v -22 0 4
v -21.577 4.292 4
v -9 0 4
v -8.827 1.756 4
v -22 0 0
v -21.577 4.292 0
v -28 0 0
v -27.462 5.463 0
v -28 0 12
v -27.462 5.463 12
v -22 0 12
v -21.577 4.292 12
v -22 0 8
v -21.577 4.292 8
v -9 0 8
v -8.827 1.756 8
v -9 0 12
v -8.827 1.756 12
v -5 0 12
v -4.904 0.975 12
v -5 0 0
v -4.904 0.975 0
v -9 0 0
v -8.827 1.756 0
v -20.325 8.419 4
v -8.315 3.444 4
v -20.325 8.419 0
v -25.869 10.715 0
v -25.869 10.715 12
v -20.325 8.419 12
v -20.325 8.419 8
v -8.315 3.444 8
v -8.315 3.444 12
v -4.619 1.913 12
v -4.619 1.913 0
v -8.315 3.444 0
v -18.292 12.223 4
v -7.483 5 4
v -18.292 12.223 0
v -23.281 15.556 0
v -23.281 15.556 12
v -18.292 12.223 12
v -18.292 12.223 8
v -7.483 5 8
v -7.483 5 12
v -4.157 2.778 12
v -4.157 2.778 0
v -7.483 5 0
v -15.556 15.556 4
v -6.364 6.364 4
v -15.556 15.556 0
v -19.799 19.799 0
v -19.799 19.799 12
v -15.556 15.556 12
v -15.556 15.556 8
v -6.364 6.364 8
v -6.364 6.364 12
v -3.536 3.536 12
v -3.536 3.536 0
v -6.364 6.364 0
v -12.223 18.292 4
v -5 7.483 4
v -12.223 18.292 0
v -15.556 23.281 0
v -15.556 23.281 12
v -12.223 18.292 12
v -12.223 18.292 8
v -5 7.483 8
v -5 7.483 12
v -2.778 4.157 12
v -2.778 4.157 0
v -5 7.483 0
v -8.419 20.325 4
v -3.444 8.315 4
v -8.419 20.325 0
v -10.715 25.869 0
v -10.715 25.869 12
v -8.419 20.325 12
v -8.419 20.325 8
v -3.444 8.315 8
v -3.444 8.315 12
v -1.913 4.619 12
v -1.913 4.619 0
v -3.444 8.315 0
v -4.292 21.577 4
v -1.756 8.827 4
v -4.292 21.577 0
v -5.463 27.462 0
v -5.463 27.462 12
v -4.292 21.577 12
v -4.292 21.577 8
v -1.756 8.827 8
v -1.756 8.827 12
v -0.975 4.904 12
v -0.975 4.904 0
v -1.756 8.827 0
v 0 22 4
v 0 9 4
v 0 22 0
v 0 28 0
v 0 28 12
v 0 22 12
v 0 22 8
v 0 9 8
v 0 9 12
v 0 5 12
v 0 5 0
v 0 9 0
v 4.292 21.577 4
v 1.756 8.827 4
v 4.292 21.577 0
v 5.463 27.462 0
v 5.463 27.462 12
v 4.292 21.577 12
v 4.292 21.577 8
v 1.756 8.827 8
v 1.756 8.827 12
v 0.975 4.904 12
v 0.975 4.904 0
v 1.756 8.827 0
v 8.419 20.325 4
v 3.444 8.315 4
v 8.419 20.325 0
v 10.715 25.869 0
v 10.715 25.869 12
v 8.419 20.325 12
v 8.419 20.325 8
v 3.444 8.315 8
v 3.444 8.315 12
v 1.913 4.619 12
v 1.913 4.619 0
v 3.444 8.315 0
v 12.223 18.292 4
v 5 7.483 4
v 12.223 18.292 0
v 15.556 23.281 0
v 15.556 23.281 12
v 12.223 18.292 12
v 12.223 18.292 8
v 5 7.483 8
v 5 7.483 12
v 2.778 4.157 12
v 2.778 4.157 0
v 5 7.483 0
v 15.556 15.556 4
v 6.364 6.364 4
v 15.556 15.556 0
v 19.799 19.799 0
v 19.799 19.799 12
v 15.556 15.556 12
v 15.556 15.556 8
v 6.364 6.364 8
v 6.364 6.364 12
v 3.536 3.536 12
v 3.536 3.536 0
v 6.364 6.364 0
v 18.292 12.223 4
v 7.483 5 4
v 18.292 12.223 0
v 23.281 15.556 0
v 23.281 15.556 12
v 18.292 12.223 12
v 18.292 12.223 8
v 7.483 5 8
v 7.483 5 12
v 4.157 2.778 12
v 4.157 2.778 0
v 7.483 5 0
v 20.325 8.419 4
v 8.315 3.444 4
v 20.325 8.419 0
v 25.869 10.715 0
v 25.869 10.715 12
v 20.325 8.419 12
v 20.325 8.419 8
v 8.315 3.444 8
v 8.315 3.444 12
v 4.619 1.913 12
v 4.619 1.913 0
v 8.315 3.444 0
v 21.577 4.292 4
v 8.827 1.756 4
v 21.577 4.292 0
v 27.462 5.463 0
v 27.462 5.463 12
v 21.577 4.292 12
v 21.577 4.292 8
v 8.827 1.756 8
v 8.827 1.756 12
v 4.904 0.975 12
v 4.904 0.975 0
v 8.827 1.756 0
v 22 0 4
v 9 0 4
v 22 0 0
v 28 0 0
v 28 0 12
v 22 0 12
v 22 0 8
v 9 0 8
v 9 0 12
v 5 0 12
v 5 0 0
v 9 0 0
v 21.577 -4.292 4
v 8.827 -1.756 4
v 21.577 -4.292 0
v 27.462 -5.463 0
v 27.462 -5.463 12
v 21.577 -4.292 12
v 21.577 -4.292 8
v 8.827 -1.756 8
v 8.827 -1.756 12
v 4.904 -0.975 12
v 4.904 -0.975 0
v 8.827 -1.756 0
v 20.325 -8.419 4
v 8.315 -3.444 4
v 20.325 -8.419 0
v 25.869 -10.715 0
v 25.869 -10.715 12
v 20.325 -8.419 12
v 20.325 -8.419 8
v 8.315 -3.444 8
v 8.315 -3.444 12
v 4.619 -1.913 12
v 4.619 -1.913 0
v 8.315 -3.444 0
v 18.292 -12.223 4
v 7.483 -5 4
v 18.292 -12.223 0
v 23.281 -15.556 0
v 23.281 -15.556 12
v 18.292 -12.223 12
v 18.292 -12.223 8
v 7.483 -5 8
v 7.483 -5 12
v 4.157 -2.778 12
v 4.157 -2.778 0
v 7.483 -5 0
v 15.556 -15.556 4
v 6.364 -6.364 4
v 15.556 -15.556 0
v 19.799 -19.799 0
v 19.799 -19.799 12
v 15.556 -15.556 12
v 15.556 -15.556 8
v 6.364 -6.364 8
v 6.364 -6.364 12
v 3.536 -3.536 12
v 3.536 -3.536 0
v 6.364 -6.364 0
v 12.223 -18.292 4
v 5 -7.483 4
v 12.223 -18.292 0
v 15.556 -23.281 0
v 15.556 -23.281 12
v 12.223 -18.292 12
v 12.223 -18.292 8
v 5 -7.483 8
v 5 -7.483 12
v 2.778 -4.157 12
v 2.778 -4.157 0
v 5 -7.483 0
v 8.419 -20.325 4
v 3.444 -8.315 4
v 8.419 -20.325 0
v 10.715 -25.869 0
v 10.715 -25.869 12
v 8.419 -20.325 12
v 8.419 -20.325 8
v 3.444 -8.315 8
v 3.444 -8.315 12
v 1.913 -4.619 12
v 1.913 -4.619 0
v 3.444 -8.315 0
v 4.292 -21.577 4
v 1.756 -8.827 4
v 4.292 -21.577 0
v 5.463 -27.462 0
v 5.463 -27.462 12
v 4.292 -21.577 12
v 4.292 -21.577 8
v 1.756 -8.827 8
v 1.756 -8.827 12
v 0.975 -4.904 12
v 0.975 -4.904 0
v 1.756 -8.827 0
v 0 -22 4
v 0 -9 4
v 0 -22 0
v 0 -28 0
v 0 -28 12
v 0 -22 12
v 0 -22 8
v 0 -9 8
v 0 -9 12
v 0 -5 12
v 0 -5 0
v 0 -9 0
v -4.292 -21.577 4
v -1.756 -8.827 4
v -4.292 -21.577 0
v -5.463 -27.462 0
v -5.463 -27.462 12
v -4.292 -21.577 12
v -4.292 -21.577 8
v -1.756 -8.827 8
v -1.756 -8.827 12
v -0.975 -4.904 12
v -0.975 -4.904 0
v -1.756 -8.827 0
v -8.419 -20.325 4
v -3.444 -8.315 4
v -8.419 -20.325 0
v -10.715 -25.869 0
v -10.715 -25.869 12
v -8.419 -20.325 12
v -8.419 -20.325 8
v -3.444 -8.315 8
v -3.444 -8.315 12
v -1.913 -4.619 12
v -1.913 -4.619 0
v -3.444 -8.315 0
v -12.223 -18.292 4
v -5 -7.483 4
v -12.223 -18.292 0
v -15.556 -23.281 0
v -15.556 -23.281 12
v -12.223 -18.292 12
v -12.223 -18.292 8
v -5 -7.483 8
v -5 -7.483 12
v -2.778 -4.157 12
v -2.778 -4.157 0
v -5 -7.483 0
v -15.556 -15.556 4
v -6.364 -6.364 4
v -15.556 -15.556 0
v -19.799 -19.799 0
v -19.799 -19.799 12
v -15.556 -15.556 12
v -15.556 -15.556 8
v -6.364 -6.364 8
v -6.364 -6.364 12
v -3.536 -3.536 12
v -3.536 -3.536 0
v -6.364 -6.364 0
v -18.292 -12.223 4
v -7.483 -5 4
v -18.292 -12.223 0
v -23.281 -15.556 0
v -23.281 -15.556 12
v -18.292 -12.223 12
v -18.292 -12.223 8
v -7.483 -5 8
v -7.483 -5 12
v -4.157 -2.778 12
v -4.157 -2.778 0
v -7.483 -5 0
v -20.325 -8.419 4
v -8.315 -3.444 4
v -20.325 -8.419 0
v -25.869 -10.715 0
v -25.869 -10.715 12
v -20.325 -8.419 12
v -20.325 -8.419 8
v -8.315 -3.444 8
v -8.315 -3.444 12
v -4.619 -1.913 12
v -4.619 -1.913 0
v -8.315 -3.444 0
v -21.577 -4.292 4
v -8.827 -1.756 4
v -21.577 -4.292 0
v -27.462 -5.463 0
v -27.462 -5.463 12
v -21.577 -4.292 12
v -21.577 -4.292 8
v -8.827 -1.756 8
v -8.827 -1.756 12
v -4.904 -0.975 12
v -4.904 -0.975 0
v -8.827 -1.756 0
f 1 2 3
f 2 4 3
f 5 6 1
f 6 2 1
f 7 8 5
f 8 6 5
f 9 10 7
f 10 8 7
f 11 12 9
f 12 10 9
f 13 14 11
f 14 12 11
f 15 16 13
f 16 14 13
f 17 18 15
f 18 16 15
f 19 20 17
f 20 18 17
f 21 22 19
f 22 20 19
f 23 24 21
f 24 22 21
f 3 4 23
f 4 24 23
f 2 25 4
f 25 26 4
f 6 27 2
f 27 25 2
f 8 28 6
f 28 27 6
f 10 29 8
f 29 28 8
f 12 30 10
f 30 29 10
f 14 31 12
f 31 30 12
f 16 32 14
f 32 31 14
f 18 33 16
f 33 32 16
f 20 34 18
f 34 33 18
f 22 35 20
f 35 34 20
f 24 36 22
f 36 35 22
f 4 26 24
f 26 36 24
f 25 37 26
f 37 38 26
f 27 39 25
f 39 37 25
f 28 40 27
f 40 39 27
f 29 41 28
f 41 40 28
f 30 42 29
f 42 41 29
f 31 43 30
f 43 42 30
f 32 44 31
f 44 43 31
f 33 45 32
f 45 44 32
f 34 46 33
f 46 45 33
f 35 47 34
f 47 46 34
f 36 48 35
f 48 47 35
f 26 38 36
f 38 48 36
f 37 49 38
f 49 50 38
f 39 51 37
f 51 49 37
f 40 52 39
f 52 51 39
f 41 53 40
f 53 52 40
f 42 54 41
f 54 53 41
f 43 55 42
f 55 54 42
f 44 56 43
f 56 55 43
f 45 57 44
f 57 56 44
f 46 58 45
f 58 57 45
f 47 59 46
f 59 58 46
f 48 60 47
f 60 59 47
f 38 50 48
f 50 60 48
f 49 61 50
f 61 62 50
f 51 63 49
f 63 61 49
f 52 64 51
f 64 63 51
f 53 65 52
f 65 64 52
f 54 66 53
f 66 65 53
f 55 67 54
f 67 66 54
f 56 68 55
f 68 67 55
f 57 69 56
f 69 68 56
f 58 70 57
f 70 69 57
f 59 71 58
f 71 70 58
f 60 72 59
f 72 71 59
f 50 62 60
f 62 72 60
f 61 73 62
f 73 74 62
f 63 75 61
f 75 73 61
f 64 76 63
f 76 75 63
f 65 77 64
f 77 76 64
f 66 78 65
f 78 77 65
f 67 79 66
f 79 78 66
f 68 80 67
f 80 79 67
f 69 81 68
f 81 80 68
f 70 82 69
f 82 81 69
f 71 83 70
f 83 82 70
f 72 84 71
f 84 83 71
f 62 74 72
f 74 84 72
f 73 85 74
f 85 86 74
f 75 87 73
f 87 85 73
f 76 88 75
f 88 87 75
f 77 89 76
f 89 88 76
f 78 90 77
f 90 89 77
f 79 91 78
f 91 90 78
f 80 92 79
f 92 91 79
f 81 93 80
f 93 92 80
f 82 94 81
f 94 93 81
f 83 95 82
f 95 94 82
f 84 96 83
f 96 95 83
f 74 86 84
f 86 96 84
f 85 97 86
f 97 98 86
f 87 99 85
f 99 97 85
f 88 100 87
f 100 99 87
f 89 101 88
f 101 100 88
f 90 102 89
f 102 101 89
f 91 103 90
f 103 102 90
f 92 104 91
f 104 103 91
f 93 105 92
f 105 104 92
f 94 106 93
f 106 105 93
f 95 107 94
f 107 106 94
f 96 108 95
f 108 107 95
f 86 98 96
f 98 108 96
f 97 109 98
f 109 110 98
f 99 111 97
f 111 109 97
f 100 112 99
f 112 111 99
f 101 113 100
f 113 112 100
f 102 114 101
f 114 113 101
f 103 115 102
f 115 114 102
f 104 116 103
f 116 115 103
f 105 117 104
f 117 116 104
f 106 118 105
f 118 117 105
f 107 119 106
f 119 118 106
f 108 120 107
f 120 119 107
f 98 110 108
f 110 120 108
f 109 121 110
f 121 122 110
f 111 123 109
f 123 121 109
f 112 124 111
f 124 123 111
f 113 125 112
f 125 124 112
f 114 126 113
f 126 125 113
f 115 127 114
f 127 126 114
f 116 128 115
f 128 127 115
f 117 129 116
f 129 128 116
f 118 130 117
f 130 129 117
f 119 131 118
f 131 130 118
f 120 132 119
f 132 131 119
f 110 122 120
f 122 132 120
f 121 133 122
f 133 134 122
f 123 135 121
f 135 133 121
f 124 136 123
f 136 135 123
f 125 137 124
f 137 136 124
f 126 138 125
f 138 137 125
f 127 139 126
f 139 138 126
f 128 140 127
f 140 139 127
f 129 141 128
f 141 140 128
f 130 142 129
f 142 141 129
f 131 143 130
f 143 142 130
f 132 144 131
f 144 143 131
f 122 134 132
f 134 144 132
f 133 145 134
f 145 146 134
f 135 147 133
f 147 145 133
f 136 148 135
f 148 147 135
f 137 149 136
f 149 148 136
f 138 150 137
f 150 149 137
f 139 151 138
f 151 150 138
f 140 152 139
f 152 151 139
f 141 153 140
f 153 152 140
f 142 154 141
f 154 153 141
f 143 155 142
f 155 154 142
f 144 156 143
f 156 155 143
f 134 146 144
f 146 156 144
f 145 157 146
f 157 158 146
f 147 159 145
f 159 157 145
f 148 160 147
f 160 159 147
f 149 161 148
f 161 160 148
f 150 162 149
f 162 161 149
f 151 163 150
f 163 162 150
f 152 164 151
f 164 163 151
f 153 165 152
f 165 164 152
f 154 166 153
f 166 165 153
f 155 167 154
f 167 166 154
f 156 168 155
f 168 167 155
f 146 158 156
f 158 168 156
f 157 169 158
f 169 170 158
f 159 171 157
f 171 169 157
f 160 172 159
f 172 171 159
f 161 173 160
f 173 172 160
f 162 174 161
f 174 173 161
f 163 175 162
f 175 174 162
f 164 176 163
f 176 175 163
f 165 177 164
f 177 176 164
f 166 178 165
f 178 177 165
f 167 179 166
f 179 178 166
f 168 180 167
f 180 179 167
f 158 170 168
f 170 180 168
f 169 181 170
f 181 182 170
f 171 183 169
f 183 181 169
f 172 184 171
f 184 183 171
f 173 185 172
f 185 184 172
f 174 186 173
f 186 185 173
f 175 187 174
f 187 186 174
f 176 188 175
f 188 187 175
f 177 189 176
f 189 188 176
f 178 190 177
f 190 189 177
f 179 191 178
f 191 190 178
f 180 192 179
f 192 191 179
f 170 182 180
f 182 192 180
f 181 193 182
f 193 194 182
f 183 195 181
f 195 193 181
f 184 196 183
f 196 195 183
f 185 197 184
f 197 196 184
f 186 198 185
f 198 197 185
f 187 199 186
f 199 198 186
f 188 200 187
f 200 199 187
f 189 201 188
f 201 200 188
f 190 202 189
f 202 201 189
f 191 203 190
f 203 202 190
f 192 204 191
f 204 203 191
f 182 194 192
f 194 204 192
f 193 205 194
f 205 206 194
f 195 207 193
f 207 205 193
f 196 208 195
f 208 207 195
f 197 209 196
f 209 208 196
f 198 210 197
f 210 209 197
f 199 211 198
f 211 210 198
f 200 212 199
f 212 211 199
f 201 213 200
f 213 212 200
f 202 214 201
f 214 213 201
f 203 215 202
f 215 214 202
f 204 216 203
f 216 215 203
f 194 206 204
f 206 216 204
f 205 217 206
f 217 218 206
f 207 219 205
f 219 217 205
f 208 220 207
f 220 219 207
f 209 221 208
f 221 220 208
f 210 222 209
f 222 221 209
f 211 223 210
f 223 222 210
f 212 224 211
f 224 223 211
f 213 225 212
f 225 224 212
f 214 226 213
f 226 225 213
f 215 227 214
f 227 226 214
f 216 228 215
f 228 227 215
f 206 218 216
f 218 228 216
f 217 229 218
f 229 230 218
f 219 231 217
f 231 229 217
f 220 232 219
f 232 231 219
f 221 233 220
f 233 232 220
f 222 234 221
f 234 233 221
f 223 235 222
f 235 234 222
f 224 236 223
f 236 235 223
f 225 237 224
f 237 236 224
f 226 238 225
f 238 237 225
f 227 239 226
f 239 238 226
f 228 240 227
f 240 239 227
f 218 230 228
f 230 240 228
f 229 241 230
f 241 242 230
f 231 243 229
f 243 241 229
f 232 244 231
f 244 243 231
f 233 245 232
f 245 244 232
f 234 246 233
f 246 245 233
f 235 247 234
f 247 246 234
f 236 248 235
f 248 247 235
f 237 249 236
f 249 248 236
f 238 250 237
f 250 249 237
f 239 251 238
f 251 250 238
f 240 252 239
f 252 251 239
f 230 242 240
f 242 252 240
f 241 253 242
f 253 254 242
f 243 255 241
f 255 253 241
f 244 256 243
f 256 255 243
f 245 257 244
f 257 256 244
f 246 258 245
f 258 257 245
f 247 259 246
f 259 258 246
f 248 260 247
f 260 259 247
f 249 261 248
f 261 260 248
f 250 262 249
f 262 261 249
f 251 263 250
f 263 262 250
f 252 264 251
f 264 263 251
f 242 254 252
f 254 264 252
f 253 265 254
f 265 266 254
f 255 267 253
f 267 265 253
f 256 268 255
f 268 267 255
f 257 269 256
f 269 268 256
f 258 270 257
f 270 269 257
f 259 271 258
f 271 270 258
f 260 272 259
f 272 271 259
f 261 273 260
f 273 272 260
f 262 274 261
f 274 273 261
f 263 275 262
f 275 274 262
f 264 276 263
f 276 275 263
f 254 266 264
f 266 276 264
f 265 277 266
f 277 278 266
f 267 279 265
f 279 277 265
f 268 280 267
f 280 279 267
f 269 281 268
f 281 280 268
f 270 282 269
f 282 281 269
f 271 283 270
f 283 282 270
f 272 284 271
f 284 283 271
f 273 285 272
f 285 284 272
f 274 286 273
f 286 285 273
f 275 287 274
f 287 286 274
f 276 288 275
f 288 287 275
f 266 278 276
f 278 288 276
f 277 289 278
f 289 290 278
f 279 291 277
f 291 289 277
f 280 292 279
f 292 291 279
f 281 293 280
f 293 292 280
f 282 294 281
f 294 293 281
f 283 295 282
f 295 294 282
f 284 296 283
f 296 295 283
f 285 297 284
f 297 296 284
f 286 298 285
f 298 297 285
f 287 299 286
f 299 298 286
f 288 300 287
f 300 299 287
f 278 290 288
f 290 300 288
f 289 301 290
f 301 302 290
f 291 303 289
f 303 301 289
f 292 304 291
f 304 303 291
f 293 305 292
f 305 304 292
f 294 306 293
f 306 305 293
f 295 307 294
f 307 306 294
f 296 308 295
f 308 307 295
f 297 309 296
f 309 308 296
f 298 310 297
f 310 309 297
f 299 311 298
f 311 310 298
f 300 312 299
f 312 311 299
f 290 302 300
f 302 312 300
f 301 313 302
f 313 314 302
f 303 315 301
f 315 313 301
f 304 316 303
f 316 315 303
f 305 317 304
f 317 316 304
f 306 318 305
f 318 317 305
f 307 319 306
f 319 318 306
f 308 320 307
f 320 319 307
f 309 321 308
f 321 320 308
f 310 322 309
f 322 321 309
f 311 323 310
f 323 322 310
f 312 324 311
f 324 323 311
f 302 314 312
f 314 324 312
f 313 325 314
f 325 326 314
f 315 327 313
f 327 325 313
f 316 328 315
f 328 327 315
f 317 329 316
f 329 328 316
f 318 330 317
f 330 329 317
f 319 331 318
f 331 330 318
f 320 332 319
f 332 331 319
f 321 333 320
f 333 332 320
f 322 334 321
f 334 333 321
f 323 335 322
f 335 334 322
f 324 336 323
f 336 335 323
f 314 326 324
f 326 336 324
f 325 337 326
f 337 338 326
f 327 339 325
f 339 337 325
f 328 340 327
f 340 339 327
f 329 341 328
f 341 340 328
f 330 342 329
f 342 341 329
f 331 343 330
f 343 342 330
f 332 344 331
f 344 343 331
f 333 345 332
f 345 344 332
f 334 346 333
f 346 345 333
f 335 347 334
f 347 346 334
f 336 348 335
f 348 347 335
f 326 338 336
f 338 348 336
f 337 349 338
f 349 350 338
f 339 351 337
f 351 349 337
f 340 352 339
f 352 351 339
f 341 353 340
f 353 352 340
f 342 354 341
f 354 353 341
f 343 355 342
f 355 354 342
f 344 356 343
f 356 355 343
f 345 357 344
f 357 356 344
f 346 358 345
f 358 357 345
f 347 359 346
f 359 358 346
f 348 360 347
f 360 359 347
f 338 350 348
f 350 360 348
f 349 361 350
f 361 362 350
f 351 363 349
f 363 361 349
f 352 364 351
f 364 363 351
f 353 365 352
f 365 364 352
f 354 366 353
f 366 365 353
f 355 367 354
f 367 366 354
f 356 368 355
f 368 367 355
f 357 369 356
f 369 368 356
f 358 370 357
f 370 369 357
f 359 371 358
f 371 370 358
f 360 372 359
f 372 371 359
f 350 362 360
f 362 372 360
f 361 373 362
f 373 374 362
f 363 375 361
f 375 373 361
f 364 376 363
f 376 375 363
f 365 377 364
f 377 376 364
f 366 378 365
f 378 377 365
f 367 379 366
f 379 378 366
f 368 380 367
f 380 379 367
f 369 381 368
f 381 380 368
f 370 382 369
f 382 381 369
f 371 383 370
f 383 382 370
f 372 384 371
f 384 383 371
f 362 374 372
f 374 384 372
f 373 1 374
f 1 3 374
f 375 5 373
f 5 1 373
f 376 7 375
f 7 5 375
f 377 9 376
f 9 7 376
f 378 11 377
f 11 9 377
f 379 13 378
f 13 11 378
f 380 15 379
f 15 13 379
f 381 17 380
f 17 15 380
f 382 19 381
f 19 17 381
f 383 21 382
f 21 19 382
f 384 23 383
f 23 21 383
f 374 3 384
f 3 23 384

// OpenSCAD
$fn = 32;

// ----------------------------------------------------------------------
// Revolved part: handwheel R28
// ----------------------------------------------------------------------

// --- parameters (mm) ---
bore_r = 5;               // bore radius
rim_r = 28;               // rim radius
rim_w = 6;                // rim axial width
rim_t = 12;               // rim diameter height
hub_r = 9;                // hub radius
web_t = 4;                // web thickness
revolve_angle = 360;      // revolve sweep, degrees
fit_tol = 0.1;            // declared fit tolerance (prompt contract)
free_tol = 0.3;           // declared free tolerance (prompt contract)

bore_d = 2 * bore_r;
rim_d = 2 * rim_r;
hub_d = 2 * hub_r;

profile = [[5, 0], [9, 0], [9, 4], [22, 4], [22, 0], [28, 0], [28, 12], [22, 12], [22, 8], [9, 8], [9, 12], [5, 12]];  // primary outline, 12 points, counter clockwise

// --- the one profile operation ---
rotate_extrude(angle = revolve_angle) polygon(points = profile);
